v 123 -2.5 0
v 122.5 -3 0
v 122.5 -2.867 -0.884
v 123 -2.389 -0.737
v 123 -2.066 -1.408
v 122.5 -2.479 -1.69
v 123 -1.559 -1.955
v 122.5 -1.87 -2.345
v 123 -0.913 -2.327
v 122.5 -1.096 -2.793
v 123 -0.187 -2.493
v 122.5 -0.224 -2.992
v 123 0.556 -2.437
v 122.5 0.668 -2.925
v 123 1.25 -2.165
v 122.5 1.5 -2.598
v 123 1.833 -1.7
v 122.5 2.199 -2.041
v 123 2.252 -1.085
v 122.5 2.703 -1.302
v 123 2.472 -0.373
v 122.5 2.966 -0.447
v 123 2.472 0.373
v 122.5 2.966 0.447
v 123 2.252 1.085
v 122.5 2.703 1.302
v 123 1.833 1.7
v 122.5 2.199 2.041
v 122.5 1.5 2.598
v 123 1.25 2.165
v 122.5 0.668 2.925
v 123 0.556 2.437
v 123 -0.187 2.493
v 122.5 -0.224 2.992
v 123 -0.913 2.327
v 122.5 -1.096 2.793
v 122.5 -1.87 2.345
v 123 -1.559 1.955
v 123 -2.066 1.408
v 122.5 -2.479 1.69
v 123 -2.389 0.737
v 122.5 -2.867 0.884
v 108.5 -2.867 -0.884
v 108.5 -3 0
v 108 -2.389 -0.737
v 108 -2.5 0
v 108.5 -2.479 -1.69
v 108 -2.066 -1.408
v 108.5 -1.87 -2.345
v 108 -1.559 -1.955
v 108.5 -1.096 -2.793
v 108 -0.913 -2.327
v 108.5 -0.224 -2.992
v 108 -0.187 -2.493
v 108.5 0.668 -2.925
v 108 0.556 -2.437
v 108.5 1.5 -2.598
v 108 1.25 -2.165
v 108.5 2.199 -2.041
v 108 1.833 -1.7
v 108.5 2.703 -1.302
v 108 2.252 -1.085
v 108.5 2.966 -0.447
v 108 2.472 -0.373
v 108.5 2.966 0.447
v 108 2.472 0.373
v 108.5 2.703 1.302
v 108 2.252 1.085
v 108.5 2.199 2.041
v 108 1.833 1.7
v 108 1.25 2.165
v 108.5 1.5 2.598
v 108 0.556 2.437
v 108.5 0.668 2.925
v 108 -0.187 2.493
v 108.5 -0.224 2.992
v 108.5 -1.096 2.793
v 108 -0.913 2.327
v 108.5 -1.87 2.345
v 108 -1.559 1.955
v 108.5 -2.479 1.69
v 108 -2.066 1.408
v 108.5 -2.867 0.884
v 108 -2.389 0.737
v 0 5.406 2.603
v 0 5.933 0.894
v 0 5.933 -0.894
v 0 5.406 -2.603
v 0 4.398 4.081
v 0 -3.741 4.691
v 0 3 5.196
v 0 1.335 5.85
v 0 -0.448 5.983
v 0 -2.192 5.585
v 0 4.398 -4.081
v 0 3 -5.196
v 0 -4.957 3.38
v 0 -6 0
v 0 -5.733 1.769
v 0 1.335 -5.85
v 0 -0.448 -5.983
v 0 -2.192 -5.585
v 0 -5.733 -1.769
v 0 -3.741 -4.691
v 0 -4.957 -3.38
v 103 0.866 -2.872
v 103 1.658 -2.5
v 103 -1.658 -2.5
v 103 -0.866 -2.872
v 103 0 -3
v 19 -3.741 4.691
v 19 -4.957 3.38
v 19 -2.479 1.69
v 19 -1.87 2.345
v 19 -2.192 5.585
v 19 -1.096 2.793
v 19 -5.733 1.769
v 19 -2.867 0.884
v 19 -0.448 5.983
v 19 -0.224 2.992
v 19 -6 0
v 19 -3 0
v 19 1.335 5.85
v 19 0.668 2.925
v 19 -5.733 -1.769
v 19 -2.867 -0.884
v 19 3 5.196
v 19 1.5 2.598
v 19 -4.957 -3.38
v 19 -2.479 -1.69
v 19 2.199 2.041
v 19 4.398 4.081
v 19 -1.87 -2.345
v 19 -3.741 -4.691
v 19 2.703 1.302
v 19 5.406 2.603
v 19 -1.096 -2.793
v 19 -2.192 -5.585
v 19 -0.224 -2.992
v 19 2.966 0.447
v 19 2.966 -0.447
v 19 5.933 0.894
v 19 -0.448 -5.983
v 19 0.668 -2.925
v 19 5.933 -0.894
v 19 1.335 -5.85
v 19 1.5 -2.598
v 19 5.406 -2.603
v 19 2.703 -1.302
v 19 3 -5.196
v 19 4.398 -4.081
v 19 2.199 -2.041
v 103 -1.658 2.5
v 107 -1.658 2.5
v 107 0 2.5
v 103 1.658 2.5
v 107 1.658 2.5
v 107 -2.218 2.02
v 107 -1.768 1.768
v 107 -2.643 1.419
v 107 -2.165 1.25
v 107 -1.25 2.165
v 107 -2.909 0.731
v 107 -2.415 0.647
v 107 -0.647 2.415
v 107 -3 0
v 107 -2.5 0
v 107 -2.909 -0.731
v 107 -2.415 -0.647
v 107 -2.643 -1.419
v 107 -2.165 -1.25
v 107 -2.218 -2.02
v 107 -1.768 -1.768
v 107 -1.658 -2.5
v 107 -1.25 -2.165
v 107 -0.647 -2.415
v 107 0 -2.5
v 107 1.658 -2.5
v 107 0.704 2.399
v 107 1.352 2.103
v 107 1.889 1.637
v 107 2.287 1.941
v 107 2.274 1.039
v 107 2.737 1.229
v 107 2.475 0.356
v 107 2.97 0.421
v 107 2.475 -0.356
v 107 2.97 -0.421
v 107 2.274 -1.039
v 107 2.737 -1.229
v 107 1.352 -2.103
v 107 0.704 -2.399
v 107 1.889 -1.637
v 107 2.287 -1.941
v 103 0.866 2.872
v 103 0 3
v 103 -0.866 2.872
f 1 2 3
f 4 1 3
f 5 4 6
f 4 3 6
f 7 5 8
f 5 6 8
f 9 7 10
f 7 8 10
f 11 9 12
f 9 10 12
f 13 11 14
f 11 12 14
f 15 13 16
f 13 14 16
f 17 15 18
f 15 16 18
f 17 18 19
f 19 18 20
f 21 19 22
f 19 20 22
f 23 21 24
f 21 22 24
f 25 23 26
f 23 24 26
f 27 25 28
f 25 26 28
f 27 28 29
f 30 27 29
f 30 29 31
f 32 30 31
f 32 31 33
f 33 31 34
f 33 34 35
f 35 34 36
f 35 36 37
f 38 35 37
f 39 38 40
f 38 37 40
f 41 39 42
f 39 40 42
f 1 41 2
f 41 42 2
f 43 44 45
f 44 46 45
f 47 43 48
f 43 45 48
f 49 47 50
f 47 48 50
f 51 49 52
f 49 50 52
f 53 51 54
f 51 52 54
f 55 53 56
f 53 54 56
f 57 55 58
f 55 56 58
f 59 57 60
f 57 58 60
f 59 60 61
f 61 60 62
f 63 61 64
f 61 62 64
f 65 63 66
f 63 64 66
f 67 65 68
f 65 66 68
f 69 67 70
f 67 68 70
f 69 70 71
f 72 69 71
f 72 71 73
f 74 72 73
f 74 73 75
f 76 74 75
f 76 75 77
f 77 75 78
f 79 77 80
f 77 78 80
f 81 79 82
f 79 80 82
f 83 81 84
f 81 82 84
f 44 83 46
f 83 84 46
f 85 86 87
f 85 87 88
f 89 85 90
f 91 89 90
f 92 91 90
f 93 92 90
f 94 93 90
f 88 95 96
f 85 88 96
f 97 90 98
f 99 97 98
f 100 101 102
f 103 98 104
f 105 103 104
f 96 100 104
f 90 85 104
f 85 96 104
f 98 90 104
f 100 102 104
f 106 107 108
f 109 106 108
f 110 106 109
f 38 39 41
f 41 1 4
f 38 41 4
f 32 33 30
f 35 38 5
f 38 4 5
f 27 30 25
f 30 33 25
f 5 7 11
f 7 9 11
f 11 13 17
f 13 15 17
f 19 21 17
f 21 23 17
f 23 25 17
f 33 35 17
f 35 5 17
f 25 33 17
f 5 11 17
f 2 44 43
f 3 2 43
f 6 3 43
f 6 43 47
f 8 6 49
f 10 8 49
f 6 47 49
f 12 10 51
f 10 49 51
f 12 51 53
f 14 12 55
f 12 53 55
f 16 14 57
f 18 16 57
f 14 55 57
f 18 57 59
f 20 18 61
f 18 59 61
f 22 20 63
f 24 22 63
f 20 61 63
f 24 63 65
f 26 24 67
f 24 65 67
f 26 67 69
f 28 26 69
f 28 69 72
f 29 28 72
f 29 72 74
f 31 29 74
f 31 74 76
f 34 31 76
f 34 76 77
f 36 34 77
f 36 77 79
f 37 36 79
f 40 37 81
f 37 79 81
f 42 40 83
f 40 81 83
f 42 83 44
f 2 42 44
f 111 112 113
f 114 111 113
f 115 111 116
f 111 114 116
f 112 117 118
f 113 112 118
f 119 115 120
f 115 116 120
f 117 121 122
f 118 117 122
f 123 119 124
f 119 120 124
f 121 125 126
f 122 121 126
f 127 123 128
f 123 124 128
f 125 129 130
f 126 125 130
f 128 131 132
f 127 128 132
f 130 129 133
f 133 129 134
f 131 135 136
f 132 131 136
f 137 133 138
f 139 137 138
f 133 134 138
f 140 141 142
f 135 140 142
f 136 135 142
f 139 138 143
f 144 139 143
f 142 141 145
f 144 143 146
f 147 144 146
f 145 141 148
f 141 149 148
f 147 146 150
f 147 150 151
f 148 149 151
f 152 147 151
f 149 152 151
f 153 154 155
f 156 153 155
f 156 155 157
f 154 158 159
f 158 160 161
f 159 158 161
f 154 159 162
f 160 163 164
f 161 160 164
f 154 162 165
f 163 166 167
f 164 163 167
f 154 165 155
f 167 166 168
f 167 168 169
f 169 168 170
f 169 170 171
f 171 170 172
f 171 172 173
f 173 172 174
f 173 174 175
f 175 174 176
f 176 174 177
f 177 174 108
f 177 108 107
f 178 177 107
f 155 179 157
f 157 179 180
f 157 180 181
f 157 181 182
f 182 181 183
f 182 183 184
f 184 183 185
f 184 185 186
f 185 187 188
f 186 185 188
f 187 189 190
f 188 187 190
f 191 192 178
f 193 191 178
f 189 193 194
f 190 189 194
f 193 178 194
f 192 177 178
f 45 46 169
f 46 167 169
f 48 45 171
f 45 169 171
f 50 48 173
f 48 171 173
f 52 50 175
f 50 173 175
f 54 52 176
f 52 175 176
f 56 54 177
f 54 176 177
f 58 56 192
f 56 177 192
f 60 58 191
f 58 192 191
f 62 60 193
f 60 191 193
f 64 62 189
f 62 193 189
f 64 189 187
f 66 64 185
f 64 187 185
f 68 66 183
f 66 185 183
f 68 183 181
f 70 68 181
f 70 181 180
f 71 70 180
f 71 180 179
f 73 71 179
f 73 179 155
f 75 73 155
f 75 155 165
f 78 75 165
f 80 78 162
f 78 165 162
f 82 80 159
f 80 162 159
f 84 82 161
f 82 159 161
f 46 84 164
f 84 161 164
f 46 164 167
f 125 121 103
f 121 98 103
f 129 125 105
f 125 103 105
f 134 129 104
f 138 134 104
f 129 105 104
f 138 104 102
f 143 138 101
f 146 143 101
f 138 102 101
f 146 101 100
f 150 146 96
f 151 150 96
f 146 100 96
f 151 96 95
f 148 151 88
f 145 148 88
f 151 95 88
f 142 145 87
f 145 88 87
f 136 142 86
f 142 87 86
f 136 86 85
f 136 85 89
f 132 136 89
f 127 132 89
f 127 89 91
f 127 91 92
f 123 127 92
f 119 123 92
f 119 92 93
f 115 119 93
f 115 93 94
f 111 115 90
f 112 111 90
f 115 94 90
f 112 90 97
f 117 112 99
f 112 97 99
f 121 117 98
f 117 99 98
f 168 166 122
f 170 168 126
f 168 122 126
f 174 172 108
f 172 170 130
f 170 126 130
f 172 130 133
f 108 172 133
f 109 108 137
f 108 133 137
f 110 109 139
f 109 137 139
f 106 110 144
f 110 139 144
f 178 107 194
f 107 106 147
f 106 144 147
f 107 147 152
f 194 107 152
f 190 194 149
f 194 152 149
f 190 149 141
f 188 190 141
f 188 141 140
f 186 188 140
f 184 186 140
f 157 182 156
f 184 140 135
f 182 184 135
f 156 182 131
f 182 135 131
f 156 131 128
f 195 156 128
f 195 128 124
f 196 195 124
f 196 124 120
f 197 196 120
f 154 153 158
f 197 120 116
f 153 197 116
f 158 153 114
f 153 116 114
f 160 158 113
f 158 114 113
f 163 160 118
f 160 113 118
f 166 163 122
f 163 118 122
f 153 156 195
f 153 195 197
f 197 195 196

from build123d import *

# Parameters (mm, degrees)
CHAMFER1_SIZE      = 0.5
SKETCH2_W          = 3.5
SKETCH2_H          = 12
CUT_EXTRUDE1_DEPTH = 4


with BuildPart() as part:
    # Sketch1 → Revolve1 (revolve)
    with BuildSketch(Plane.XY):
        Polygon((0, -6), (0, 0), (123, 0), (123, -3), (108.5, -3), (108, -2.5), (107, -2.5), (107, -3), (19, -3), (19, -6), align=None)
    revolve(axis=Axis((-26.391164048, 0, 0), (1, 0, 0)))

    # Chamfer1
    chamfer1_edges = [part.edges().sort_by_distance(p)[0] for p in [
        (123, 3, 0),
    ]]
    chamfer(chamfer1_edges, length=CHAMFER1_SIZE)

    # Sketch2 → Cut-Extrude1 (cut)
    with BuildSketch(Plane(origin=(107, 0, 0), x_dir=(0, 0, -1), z_dir=(1, 0, 0))):
        with Locations((-4.25, 0)):
            Rectangle(SKETCH2_W, SKETCH2_H)
    cut_extrude1 = extrude(amount=-CUT_EXTRUDE1_DEPTH, mode=Mode.SUBTRACT)

    # Mirror1: Cut-Extrude1 across plane
    add(cut_extrude1.mirror(Plane.XY), mode=Mode.SUBTRACT)


solid = part.part
